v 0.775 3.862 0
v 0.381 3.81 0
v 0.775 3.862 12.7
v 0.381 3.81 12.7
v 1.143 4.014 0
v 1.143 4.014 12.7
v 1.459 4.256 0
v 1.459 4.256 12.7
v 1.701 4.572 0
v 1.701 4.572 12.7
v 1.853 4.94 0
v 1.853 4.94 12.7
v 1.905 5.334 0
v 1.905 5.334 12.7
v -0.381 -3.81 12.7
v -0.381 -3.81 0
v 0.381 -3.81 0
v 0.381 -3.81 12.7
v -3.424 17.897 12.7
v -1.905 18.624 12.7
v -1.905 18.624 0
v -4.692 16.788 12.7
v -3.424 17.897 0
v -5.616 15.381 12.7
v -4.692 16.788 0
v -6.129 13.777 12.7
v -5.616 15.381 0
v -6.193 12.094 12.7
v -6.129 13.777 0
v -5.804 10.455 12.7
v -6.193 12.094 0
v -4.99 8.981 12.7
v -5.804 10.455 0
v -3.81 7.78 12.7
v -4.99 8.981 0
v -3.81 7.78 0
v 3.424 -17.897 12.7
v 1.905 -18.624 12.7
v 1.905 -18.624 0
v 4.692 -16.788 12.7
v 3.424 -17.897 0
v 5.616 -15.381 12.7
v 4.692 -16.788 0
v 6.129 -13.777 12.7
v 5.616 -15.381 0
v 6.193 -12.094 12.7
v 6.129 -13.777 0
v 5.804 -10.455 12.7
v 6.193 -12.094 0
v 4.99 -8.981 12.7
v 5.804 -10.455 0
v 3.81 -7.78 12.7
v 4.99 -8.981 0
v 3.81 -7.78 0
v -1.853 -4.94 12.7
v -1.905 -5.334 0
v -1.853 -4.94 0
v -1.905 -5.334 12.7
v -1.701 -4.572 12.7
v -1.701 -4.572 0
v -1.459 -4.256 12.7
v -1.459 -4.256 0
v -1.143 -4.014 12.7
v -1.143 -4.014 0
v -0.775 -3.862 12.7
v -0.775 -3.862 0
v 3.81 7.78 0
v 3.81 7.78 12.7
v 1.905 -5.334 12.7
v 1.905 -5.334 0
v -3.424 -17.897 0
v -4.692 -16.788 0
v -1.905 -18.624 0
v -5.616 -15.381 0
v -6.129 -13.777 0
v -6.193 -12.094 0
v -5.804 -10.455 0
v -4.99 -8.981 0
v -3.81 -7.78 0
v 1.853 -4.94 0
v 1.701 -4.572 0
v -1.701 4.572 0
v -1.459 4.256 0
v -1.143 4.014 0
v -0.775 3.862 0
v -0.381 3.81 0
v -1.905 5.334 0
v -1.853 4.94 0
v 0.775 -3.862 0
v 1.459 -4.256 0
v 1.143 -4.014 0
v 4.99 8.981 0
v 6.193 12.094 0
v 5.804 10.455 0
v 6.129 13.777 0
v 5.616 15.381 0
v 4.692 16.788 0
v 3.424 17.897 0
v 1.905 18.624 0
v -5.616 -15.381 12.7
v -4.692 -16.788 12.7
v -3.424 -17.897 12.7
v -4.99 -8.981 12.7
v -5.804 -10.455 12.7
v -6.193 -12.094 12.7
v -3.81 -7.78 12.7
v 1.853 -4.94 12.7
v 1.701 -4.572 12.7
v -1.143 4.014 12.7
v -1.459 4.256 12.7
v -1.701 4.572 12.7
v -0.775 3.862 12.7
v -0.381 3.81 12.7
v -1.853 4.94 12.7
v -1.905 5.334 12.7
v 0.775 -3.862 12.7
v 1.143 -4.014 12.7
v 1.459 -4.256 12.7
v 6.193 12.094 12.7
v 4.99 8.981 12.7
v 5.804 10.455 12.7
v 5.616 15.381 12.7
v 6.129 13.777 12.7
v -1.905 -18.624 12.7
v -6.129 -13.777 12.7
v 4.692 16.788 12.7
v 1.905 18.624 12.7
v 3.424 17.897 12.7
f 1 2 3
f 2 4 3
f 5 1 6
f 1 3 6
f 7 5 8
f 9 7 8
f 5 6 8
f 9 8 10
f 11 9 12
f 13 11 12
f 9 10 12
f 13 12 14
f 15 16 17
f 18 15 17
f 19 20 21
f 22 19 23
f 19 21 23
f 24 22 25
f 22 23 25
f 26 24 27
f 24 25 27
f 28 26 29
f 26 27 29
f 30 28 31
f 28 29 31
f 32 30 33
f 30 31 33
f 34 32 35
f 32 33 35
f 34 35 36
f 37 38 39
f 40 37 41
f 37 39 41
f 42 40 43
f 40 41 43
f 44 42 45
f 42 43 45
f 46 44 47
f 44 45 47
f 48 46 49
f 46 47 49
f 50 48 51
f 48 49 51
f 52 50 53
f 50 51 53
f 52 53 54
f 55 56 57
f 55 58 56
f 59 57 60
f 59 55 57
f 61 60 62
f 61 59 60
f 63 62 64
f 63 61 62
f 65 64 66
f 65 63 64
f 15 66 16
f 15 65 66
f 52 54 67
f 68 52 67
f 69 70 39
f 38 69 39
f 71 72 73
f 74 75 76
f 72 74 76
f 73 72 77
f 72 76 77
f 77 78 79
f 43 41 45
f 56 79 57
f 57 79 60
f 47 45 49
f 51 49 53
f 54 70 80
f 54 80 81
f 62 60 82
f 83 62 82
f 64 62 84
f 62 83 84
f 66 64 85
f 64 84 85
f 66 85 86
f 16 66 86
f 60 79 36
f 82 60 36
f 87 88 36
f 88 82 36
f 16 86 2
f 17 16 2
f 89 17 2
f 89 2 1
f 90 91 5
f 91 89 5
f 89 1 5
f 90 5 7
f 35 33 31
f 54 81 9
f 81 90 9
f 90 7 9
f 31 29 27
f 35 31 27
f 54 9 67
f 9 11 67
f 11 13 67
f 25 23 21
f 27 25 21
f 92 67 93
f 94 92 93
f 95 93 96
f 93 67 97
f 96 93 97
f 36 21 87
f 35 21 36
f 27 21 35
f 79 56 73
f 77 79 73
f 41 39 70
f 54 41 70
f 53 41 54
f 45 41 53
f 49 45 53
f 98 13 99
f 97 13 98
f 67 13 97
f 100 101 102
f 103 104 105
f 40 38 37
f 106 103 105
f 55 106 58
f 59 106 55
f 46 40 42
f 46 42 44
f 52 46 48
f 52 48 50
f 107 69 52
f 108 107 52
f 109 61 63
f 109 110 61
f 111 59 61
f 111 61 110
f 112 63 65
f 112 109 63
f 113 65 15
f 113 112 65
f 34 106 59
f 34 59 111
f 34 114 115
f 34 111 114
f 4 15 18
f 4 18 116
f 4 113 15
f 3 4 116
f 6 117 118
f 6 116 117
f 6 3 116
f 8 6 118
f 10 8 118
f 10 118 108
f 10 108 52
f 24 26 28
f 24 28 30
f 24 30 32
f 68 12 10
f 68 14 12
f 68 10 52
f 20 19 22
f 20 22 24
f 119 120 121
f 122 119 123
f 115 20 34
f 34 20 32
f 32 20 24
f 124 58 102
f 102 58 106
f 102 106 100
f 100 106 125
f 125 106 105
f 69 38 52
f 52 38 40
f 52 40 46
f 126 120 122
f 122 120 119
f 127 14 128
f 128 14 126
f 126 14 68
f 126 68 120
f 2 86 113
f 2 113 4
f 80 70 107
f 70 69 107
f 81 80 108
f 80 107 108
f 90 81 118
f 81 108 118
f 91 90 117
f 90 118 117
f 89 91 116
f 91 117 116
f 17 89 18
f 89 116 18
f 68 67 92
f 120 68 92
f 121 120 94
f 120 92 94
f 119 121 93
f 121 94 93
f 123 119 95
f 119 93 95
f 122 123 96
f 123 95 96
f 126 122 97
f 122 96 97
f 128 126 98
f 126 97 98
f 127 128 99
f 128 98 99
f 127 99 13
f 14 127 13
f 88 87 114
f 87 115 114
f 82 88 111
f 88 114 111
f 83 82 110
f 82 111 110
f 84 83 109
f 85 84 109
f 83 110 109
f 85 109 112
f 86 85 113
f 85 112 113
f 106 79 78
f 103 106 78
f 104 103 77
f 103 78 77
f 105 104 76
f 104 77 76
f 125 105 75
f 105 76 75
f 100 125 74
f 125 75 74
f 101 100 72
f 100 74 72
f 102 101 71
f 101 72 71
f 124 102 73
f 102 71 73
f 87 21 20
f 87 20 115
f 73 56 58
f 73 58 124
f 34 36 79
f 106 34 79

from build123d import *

# Parameters (mm, degrees)
F1_DEPTH = 12.7
F2_W     = 3.81
F2_H     = 25.6764874435
F3_DEPTH = 25.4
F4_R     = 1.524


with BuildPart() as f1:
    # F0 (on Top) → F1 (new body)
    with BuildSketch(Plane.XY):
        with BuildLine():
            Line((-3.81, 7.7796718605), (-3.81, -7.7796718605))
            ThreePointArc((-3.81, -7.7796718605), (0, -18.923), (3.81, -7.7796718605))
            Line((3.81, -7.7796718605), (3.81, 7.7796718605))
            ThreePointArc((3.81, 7.7796718605), (0, 18.923), (-3.81, 7.7796718605))
        make_face()
    extrude(amount=F1_DEPTH)

    # F2 (on face) → F3 (cut)
    with BuildSketch(Plane(origin=(0, 0, 0), x_dir=(1, 0, 0), z_dir=(0, 0, -1))):
        with Locations((0, -16.6482437217)):
            Rectangle(F2_W, F2_H)
        with Locations((0, 16.6482437217)):
            Rectangle(F2_W, F2_H)
    extrude(amount=-F3_DEPTH, mode=Mode.SUBTRACT)

    # F4
    f4_edges = [f1.edges().sort_by_distance(p)[0] for p in [
        (1.905, 3.81, 6.35),
        (-1.905, 3.81, 6.35),
        (1.905, -3.81, 6.35),
        (-1.905, -3.81, 6.35),
    ]]
    fillet(f4_edges, radius=F4_R)


solid = f1.part
